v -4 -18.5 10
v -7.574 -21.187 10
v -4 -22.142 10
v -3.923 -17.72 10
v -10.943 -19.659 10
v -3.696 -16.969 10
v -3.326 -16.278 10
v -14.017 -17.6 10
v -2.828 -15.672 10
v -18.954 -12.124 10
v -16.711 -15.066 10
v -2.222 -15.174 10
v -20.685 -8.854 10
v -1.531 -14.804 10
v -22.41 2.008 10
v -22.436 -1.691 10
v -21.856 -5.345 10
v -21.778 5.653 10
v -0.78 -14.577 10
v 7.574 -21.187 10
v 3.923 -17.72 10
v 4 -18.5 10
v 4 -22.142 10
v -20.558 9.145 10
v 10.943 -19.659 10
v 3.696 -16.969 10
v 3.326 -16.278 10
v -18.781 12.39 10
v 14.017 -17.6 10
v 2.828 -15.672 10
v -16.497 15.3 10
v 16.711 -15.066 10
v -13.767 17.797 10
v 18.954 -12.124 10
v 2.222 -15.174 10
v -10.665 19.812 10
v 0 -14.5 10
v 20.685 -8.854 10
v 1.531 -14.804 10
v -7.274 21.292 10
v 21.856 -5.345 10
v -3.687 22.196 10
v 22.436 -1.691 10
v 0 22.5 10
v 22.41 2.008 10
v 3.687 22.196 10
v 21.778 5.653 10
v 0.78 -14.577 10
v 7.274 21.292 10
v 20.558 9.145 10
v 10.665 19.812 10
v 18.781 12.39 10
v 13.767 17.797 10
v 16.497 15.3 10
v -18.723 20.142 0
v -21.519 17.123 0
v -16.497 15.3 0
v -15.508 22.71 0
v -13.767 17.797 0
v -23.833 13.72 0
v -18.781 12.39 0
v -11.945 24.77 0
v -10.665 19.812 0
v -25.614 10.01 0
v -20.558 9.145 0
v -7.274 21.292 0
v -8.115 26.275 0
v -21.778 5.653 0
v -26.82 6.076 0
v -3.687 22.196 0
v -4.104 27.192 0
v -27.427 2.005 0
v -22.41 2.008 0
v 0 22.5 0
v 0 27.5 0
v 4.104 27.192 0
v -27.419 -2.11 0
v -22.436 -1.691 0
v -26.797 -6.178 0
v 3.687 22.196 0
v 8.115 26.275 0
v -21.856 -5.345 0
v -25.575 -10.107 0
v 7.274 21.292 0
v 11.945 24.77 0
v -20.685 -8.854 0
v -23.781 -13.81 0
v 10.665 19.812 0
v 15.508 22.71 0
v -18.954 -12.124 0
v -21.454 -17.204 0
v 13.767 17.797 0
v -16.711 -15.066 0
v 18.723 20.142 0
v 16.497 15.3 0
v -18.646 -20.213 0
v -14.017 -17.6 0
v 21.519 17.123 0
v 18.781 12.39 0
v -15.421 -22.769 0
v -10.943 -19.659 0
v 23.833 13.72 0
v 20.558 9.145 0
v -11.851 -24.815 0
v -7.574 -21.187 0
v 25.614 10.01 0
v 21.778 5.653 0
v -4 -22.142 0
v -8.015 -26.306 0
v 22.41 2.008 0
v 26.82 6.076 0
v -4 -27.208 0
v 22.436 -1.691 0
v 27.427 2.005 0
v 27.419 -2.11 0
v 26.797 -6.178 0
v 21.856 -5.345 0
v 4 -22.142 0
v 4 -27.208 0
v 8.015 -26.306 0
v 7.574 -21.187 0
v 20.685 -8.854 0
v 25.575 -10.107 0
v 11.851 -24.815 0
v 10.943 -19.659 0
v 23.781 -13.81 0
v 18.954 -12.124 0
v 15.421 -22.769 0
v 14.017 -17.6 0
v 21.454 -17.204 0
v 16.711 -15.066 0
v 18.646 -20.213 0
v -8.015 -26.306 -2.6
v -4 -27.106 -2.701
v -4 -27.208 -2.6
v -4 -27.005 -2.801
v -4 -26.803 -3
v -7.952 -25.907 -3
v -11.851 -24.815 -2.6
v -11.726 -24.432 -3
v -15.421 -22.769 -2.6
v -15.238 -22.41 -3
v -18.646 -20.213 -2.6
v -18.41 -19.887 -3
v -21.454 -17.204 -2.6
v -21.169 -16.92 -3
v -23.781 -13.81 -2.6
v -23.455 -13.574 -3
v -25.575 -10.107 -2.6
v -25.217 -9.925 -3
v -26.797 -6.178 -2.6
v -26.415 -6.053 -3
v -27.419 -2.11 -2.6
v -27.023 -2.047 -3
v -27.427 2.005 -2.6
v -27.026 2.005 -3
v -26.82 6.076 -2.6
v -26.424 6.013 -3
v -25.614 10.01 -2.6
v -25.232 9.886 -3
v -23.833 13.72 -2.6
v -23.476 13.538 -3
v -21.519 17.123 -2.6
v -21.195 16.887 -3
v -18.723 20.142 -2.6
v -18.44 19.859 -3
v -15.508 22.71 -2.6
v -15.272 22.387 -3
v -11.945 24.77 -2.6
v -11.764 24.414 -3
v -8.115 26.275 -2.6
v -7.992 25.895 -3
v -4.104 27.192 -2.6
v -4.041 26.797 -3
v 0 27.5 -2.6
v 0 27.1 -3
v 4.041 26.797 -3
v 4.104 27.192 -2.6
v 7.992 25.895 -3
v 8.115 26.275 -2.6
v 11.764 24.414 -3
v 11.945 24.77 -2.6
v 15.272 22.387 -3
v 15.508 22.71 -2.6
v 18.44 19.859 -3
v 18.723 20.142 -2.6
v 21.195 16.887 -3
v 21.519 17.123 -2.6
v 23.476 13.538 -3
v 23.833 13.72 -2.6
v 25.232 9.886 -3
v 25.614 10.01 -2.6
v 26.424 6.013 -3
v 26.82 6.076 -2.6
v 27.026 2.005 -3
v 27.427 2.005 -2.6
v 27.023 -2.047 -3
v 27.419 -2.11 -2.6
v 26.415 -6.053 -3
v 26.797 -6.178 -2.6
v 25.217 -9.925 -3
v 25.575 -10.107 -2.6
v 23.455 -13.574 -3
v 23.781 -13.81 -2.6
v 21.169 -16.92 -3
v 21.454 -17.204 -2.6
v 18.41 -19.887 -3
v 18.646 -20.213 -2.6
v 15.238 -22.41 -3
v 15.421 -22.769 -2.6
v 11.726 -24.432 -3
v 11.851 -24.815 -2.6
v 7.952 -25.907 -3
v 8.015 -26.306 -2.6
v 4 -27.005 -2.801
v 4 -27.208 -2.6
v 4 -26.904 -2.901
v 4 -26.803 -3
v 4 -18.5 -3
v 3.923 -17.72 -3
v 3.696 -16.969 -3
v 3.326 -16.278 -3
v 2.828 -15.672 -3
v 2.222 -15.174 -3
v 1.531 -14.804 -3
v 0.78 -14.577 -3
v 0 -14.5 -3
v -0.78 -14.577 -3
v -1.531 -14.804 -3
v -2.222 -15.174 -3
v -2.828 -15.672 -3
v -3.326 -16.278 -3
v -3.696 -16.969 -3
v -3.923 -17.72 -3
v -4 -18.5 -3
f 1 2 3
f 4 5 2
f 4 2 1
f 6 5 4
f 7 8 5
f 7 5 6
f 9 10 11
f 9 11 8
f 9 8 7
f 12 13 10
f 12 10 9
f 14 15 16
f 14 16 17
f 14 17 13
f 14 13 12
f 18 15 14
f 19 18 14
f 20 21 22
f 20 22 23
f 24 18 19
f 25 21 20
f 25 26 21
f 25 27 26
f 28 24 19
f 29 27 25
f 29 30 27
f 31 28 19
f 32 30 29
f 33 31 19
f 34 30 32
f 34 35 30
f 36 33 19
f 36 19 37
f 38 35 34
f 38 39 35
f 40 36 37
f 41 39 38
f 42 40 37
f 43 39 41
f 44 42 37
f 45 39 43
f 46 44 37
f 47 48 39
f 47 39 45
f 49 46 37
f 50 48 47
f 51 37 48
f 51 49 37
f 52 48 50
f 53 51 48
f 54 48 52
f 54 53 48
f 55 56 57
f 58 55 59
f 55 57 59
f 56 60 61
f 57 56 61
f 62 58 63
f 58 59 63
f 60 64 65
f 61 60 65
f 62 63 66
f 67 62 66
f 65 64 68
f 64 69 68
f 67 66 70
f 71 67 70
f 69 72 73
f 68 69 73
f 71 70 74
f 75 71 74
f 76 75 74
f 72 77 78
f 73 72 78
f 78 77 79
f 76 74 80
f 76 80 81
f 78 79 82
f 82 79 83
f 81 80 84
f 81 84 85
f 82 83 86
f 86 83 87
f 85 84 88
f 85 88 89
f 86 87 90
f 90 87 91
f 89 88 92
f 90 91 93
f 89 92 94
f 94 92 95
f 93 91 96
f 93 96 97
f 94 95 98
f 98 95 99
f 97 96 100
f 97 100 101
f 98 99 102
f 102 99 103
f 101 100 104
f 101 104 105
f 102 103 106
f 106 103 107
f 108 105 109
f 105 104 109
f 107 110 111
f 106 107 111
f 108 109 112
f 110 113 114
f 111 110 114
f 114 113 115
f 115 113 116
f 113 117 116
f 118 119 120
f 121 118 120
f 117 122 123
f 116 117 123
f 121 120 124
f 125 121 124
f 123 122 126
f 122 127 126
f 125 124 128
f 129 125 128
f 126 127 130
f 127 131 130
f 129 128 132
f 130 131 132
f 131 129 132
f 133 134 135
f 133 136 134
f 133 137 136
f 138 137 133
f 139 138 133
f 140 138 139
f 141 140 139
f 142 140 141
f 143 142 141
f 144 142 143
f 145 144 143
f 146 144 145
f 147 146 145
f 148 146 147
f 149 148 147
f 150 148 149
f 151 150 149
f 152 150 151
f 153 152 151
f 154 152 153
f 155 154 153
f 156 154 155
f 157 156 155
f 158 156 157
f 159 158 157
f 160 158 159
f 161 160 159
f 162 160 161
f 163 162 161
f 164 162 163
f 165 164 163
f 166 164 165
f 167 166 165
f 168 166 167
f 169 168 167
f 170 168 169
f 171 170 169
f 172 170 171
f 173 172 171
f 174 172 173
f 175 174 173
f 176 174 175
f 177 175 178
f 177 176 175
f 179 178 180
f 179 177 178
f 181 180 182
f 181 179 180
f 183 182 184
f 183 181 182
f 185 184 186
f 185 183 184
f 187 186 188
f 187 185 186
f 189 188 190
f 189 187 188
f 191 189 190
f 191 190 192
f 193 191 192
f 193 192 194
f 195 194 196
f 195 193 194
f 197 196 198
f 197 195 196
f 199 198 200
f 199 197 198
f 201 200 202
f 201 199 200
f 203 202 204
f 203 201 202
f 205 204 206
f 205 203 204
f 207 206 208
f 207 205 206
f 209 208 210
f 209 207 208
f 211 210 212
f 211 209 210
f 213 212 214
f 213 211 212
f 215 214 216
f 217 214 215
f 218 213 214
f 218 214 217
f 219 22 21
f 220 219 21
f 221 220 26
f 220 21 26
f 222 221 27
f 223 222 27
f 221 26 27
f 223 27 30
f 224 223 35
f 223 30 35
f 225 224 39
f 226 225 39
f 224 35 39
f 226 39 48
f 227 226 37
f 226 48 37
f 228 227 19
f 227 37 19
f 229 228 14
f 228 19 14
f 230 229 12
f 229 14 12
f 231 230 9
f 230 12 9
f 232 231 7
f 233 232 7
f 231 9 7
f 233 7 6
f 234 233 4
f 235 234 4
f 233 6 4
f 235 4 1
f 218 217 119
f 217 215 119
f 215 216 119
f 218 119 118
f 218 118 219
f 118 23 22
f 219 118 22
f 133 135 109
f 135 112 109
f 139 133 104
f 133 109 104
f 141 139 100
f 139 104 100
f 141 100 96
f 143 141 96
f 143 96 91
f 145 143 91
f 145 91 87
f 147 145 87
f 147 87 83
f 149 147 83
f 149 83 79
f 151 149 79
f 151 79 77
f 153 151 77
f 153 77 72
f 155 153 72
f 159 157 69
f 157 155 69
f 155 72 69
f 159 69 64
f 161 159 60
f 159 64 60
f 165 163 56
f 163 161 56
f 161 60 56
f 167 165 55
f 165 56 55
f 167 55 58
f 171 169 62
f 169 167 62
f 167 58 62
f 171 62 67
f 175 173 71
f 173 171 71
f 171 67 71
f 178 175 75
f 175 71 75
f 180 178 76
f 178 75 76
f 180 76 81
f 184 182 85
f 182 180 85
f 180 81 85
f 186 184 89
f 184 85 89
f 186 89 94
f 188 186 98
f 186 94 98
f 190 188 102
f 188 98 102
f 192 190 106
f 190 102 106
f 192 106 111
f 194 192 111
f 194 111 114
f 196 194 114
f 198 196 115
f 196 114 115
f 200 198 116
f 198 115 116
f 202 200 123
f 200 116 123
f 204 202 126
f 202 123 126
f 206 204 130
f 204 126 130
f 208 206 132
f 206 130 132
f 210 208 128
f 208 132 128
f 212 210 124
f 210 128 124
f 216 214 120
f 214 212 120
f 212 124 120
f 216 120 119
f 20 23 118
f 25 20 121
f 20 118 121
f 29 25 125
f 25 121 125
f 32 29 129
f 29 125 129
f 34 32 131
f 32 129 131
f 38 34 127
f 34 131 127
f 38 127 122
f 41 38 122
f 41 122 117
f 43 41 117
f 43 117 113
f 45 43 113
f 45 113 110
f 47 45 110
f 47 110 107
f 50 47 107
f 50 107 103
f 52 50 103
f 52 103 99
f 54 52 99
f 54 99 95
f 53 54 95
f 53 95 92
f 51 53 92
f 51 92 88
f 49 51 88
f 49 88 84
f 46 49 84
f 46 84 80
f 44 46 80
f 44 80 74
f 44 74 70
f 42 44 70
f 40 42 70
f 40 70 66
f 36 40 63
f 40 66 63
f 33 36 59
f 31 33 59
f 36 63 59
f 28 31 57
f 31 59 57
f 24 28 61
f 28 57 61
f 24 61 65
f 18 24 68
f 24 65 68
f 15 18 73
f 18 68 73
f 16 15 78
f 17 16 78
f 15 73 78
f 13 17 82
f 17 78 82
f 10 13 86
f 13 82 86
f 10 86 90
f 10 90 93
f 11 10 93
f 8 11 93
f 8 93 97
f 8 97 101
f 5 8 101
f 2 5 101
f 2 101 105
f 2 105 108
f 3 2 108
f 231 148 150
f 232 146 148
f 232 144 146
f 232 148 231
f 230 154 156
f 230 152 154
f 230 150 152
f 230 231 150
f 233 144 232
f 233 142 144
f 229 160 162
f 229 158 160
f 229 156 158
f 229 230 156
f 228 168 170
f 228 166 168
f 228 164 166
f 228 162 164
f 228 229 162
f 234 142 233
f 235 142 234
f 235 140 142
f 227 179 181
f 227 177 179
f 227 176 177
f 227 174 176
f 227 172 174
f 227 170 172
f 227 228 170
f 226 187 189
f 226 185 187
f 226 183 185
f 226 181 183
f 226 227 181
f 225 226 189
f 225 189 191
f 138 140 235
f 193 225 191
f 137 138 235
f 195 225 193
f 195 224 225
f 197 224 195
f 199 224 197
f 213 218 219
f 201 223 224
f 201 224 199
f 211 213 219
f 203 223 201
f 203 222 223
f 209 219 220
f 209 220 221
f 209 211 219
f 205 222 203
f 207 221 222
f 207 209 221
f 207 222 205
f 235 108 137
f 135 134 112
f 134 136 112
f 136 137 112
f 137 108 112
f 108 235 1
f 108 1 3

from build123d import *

# Parameters (mm, degrees)
F0_R     = 22.5
F1_DEPTH = 10
F2_R     = 27.5
F3_DEPTH = 3
F4_SIZE  = 0.4
F6_DEPTH = 25


with BuildPart() as f1:
    # F0 (on Top) → F1 (new body)
    with BuildSketch(Plane.XY):
        Circle(F0_R)
    extrude(amount=F1_DEPTH)

    # F2 (on face) → F3 (join)
    with BuildSketch(Plane(origin=(0, 0, 0), x_dir=(1, 0, 0), z_dir=(0, 0, -1))):
        Circle(F2_R)
    extrude(amount=F3_DEPTH)

    # F4
    f4_edges = [f1.edges().sort_by_distance(p)[0] for p in [
        (-27.5, 0, -3),
    ]]
    chamfer(f4_edges, length=F4_SIZE)

    # F5 (on face) → F6 (cut)
    with BuildSketch(Plane.XY.offset(10)):
        with BuildLine():
            Line((4, -27.207536), (4, -18.5))
            ThreePointArc((4, -18.5), (0, -14.5), (-4, -18.5))
            Line((-4, -18.5), (-4, -27.207536))
            ThreePointArc((-4, -27.207536), (0, -27.5), (4, -27.207536))
        make_face()
    extrude(amount=-F6_DEPTH, mode=Mode.SUBTRACT)


solid = f1.part
